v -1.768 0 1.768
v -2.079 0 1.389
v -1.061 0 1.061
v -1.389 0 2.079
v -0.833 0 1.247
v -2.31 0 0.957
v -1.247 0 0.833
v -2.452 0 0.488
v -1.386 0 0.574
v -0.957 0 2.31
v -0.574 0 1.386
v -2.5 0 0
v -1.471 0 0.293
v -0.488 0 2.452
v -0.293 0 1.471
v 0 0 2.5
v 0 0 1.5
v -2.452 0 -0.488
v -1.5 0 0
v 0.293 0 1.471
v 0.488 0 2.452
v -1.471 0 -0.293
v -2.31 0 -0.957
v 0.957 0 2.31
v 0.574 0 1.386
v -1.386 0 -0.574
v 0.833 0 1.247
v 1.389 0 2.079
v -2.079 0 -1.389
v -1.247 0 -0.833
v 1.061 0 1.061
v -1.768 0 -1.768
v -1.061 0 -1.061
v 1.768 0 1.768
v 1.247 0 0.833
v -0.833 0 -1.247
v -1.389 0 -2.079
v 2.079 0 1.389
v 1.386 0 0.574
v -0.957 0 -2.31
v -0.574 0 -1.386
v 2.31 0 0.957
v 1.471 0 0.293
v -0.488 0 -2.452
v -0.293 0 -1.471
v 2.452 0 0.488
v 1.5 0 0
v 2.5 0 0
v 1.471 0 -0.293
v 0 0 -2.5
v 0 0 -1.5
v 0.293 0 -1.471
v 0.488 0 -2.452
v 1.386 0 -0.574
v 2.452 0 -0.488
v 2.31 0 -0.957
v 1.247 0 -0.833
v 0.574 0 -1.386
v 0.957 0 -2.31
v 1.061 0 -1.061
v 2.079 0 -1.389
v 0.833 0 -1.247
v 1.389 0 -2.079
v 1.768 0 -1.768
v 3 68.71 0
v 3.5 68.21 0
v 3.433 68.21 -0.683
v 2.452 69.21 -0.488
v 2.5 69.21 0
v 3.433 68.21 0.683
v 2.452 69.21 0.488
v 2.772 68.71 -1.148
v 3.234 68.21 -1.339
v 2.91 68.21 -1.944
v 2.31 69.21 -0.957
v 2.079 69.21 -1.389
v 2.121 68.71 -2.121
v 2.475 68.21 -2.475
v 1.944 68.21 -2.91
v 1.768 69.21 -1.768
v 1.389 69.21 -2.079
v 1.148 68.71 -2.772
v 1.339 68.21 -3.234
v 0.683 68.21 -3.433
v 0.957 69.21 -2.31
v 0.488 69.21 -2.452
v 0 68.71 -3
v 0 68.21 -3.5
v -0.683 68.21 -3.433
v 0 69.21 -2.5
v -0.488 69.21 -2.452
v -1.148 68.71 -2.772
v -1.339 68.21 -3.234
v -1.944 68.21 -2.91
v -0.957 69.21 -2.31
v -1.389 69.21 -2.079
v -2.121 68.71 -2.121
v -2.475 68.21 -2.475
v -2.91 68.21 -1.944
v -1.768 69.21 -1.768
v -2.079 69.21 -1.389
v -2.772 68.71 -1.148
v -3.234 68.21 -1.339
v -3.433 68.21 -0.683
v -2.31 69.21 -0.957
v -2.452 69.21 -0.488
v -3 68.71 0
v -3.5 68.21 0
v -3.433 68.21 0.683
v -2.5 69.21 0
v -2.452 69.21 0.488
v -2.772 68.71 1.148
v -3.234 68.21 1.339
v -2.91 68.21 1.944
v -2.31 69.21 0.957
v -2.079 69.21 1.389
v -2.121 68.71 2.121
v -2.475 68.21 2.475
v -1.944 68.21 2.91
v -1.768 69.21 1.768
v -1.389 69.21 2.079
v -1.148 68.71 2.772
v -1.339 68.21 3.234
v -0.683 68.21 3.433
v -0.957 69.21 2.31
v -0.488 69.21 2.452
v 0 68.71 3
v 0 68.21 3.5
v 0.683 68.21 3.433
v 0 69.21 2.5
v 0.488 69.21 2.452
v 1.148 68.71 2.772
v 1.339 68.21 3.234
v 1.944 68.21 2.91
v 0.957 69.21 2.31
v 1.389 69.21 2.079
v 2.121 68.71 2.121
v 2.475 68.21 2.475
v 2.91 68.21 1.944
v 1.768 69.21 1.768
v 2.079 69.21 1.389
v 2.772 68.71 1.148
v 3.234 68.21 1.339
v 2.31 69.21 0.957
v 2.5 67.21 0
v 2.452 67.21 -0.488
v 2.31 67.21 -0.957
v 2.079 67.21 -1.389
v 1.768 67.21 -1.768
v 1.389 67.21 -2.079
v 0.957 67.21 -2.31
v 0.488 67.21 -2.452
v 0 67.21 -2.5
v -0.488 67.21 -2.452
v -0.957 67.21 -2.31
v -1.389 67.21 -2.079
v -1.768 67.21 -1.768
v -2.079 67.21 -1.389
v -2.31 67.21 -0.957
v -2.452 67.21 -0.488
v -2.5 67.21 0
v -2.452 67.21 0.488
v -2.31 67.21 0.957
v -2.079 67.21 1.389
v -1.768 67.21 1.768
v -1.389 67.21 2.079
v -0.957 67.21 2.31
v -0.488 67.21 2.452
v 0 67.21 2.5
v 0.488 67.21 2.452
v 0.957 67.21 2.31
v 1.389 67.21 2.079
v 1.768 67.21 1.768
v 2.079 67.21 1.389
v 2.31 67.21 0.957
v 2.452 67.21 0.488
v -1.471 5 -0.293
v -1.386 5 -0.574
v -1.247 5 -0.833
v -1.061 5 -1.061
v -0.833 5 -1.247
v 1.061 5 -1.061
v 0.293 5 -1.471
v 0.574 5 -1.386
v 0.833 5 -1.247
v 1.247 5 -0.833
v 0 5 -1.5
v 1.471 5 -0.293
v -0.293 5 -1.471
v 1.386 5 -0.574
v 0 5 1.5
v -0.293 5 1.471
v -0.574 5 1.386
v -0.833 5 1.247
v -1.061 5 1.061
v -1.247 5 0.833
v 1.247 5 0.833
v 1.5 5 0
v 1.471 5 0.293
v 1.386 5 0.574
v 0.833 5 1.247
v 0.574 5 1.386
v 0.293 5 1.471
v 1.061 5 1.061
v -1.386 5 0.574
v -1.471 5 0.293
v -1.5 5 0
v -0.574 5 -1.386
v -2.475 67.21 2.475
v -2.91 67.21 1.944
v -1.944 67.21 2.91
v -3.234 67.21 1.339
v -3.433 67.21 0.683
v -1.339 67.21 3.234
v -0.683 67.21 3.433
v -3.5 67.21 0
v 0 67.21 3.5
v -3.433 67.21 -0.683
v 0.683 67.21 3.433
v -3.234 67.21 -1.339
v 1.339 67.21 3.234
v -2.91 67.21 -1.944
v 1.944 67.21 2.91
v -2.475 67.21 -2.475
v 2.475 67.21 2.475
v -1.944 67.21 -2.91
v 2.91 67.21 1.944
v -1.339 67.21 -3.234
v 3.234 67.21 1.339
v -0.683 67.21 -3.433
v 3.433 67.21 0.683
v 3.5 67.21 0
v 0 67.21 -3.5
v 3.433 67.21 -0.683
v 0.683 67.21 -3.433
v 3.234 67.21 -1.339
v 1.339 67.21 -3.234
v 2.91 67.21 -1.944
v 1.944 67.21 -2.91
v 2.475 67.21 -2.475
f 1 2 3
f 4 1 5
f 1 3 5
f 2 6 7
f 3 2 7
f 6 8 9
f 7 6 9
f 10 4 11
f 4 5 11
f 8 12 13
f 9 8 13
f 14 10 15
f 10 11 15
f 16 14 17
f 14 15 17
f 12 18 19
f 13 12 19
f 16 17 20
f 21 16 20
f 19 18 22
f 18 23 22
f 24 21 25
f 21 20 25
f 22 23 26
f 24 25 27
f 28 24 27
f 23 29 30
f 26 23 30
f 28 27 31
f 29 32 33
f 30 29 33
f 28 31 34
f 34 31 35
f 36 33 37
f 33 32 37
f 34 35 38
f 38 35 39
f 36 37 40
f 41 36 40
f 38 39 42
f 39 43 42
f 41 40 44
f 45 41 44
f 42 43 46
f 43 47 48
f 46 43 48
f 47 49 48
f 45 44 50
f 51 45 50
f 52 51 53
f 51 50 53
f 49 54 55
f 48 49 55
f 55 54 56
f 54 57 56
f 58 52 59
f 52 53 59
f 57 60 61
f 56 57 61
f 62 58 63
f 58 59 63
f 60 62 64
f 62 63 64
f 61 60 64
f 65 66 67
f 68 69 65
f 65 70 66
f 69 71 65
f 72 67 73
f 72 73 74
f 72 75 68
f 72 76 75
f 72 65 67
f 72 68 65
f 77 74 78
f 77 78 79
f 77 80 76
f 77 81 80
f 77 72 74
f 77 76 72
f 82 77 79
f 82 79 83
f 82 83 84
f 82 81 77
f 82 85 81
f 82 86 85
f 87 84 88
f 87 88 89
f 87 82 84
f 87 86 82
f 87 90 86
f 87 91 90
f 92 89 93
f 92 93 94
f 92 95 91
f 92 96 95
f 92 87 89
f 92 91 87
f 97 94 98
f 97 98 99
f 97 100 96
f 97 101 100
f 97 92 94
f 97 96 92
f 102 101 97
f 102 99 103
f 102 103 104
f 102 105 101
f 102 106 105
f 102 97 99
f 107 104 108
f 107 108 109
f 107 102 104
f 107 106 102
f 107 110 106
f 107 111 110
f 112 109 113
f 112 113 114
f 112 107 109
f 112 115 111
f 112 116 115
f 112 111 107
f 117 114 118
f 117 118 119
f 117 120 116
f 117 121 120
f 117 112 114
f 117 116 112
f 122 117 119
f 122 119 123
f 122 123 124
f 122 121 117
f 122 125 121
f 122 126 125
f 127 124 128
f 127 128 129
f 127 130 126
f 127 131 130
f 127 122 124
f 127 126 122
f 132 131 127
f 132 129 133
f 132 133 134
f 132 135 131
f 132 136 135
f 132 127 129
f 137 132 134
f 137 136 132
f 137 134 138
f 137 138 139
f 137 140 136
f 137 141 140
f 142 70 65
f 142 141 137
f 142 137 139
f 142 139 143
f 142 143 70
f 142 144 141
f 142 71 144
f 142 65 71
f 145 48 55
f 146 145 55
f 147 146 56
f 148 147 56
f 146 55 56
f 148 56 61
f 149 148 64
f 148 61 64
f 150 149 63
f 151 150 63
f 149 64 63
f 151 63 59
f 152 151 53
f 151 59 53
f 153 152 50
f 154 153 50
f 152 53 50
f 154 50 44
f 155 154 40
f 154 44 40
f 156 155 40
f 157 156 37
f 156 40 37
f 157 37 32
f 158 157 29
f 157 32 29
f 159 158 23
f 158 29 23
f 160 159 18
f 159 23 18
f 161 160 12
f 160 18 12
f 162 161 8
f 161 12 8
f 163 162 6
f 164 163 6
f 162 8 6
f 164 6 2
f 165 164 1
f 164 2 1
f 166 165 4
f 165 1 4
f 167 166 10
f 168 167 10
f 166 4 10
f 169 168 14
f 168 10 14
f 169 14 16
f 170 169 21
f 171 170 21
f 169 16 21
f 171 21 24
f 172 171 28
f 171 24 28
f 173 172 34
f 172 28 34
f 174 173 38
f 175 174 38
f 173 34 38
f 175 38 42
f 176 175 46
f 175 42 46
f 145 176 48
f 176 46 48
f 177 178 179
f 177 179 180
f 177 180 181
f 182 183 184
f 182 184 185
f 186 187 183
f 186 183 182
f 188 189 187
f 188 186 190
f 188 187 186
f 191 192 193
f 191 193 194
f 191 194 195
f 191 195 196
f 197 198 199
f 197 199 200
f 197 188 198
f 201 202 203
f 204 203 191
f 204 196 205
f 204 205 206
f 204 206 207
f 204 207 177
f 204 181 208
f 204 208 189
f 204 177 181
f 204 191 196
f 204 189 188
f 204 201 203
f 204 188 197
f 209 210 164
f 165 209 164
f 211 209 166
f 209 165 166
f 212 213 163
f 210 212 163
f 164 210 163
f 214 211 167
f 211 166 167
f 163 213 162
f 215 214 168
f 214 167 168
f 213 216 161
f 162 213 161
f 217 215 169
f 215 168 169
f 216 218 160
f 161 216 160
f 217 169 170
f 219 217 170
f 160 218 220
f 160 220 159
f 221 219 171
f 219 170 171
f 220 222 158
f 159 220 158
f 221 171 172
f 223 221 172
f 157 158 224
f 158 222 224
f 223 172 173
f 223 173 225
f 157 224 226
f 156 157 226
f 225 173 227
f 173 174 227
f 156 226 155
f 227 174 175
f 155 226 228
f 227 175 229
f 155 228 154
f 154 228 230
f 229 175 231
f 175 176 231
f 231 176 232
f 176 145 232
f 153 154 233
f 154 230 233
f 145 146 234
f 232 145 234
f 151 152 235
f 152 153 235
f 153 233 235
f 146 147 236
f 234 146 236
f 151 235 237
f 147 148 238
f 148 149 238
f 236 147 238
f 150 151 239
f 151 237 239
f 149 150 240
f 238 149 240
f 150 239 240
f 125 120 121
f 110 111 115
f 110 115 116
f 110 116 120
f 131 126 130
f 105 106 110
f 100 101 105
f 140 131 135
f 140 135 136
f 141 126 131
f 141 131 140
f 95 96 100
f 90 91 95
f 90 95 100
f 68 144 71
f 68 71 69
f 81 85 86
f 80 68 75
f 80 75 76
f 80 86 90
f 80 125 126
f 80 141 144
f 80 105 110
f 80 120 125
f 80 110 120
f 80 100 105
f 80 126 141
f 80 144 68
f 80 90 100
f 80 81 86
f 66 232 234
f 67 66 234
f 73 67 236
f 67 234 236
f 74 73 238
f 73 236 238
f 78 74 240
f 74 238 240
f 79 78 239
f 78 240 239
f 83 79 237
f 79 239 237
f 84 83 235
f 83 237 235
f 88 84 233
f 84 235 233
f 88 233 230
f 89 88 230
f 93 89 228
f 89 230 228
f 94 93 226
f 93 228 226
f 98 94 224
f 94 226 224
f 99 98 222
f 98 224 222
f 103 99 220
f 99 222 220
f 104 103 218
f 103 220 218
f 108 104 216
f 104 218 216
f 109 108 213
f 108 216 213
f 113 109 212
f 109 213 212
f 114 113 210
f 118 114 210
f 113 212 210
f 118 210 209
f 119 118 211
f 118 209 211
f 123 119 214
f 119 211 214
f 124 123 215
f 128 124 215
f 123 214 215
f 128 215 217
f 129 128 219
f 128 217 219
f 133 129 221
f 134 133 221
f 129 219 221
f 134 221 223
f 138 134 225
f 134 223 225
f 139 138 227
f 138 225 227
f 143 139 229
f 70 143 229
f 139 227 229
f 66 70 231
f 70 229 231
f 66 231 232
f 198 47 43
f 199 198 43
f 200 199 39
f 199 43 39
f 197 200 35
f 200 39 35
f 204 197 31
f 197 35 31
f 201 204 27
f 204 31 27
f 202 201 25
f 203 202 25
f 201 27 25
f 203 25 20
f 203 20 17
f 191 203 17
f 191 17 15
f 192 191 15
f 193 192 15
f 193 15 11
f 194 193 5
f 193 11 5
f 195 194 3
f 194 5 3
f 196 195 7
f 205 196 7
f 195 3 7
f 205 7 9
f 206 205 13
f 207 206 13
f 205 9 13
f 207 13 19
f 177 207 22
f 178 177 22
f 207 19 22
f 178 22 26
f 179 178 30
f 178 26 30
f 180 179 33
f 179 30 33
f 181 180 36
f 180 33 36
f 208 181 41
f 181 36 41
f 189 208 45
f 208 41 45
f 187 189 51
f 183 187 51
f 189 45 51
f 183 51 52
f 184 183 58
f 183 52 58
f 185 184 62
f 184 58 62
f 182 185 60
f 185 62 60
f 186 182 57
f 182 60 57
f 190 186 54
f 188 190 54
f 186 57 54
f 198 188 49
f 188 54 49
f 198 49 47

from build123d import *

# Parameters (mm, degrees)
SKETCH1_R           = 2.5
BOSS_EXTRUDE1_DEPTH = 67.21
SKETCH2_R           = 3.5
BOSS_EXTRUDE2_DEPTH = 2
CHAMFER1_SIZE       = 1
SKETCH3_R           = 1.5
CUT_EXTRUDE1_DEPTH  = 5


with BuildPart() as part:
    # Sketch1 → Boss-Extrude1 (new body)
    with BuildSketch(Plane(origin=(0, 0, 0), x_dir=(1, 0, 0), z_dir=(0, 1, 0))):
        Circle(SKETCH1_R)
    extrude(amount=BOSS_EXTRUDE1_DEPTH)

    # Sketch2 → Boss-Extrude2 (add)
    with BuildSketch(Plane(origin=(0, 67.21, 0), x_dir=(1, 0, 0), z_dir=(0, 1, 0))):
        Circle(SKETCH2_R)
    extrude(amount=BOSS_EXTRUDE2_DEPTH)

    # Chamfer1
    chamfer1_edges = [part.edges().sort_by_distance(p)[0] for p in [
        (-3.5, 69.21, 0),
    ]]
    chamfer(chamfer1_edges, length=CHAMFER1_SIZE)

    # Sketch3 → Cut-Extrude1 (cut)
    with BuildSketch(Plane.XZ):
        Circle(SKETCH3_R)
    extrude(amount=-CUT_EXTRUDE1_DEPTH, mode=Mode.SUBTRACT)


solid = part.part
